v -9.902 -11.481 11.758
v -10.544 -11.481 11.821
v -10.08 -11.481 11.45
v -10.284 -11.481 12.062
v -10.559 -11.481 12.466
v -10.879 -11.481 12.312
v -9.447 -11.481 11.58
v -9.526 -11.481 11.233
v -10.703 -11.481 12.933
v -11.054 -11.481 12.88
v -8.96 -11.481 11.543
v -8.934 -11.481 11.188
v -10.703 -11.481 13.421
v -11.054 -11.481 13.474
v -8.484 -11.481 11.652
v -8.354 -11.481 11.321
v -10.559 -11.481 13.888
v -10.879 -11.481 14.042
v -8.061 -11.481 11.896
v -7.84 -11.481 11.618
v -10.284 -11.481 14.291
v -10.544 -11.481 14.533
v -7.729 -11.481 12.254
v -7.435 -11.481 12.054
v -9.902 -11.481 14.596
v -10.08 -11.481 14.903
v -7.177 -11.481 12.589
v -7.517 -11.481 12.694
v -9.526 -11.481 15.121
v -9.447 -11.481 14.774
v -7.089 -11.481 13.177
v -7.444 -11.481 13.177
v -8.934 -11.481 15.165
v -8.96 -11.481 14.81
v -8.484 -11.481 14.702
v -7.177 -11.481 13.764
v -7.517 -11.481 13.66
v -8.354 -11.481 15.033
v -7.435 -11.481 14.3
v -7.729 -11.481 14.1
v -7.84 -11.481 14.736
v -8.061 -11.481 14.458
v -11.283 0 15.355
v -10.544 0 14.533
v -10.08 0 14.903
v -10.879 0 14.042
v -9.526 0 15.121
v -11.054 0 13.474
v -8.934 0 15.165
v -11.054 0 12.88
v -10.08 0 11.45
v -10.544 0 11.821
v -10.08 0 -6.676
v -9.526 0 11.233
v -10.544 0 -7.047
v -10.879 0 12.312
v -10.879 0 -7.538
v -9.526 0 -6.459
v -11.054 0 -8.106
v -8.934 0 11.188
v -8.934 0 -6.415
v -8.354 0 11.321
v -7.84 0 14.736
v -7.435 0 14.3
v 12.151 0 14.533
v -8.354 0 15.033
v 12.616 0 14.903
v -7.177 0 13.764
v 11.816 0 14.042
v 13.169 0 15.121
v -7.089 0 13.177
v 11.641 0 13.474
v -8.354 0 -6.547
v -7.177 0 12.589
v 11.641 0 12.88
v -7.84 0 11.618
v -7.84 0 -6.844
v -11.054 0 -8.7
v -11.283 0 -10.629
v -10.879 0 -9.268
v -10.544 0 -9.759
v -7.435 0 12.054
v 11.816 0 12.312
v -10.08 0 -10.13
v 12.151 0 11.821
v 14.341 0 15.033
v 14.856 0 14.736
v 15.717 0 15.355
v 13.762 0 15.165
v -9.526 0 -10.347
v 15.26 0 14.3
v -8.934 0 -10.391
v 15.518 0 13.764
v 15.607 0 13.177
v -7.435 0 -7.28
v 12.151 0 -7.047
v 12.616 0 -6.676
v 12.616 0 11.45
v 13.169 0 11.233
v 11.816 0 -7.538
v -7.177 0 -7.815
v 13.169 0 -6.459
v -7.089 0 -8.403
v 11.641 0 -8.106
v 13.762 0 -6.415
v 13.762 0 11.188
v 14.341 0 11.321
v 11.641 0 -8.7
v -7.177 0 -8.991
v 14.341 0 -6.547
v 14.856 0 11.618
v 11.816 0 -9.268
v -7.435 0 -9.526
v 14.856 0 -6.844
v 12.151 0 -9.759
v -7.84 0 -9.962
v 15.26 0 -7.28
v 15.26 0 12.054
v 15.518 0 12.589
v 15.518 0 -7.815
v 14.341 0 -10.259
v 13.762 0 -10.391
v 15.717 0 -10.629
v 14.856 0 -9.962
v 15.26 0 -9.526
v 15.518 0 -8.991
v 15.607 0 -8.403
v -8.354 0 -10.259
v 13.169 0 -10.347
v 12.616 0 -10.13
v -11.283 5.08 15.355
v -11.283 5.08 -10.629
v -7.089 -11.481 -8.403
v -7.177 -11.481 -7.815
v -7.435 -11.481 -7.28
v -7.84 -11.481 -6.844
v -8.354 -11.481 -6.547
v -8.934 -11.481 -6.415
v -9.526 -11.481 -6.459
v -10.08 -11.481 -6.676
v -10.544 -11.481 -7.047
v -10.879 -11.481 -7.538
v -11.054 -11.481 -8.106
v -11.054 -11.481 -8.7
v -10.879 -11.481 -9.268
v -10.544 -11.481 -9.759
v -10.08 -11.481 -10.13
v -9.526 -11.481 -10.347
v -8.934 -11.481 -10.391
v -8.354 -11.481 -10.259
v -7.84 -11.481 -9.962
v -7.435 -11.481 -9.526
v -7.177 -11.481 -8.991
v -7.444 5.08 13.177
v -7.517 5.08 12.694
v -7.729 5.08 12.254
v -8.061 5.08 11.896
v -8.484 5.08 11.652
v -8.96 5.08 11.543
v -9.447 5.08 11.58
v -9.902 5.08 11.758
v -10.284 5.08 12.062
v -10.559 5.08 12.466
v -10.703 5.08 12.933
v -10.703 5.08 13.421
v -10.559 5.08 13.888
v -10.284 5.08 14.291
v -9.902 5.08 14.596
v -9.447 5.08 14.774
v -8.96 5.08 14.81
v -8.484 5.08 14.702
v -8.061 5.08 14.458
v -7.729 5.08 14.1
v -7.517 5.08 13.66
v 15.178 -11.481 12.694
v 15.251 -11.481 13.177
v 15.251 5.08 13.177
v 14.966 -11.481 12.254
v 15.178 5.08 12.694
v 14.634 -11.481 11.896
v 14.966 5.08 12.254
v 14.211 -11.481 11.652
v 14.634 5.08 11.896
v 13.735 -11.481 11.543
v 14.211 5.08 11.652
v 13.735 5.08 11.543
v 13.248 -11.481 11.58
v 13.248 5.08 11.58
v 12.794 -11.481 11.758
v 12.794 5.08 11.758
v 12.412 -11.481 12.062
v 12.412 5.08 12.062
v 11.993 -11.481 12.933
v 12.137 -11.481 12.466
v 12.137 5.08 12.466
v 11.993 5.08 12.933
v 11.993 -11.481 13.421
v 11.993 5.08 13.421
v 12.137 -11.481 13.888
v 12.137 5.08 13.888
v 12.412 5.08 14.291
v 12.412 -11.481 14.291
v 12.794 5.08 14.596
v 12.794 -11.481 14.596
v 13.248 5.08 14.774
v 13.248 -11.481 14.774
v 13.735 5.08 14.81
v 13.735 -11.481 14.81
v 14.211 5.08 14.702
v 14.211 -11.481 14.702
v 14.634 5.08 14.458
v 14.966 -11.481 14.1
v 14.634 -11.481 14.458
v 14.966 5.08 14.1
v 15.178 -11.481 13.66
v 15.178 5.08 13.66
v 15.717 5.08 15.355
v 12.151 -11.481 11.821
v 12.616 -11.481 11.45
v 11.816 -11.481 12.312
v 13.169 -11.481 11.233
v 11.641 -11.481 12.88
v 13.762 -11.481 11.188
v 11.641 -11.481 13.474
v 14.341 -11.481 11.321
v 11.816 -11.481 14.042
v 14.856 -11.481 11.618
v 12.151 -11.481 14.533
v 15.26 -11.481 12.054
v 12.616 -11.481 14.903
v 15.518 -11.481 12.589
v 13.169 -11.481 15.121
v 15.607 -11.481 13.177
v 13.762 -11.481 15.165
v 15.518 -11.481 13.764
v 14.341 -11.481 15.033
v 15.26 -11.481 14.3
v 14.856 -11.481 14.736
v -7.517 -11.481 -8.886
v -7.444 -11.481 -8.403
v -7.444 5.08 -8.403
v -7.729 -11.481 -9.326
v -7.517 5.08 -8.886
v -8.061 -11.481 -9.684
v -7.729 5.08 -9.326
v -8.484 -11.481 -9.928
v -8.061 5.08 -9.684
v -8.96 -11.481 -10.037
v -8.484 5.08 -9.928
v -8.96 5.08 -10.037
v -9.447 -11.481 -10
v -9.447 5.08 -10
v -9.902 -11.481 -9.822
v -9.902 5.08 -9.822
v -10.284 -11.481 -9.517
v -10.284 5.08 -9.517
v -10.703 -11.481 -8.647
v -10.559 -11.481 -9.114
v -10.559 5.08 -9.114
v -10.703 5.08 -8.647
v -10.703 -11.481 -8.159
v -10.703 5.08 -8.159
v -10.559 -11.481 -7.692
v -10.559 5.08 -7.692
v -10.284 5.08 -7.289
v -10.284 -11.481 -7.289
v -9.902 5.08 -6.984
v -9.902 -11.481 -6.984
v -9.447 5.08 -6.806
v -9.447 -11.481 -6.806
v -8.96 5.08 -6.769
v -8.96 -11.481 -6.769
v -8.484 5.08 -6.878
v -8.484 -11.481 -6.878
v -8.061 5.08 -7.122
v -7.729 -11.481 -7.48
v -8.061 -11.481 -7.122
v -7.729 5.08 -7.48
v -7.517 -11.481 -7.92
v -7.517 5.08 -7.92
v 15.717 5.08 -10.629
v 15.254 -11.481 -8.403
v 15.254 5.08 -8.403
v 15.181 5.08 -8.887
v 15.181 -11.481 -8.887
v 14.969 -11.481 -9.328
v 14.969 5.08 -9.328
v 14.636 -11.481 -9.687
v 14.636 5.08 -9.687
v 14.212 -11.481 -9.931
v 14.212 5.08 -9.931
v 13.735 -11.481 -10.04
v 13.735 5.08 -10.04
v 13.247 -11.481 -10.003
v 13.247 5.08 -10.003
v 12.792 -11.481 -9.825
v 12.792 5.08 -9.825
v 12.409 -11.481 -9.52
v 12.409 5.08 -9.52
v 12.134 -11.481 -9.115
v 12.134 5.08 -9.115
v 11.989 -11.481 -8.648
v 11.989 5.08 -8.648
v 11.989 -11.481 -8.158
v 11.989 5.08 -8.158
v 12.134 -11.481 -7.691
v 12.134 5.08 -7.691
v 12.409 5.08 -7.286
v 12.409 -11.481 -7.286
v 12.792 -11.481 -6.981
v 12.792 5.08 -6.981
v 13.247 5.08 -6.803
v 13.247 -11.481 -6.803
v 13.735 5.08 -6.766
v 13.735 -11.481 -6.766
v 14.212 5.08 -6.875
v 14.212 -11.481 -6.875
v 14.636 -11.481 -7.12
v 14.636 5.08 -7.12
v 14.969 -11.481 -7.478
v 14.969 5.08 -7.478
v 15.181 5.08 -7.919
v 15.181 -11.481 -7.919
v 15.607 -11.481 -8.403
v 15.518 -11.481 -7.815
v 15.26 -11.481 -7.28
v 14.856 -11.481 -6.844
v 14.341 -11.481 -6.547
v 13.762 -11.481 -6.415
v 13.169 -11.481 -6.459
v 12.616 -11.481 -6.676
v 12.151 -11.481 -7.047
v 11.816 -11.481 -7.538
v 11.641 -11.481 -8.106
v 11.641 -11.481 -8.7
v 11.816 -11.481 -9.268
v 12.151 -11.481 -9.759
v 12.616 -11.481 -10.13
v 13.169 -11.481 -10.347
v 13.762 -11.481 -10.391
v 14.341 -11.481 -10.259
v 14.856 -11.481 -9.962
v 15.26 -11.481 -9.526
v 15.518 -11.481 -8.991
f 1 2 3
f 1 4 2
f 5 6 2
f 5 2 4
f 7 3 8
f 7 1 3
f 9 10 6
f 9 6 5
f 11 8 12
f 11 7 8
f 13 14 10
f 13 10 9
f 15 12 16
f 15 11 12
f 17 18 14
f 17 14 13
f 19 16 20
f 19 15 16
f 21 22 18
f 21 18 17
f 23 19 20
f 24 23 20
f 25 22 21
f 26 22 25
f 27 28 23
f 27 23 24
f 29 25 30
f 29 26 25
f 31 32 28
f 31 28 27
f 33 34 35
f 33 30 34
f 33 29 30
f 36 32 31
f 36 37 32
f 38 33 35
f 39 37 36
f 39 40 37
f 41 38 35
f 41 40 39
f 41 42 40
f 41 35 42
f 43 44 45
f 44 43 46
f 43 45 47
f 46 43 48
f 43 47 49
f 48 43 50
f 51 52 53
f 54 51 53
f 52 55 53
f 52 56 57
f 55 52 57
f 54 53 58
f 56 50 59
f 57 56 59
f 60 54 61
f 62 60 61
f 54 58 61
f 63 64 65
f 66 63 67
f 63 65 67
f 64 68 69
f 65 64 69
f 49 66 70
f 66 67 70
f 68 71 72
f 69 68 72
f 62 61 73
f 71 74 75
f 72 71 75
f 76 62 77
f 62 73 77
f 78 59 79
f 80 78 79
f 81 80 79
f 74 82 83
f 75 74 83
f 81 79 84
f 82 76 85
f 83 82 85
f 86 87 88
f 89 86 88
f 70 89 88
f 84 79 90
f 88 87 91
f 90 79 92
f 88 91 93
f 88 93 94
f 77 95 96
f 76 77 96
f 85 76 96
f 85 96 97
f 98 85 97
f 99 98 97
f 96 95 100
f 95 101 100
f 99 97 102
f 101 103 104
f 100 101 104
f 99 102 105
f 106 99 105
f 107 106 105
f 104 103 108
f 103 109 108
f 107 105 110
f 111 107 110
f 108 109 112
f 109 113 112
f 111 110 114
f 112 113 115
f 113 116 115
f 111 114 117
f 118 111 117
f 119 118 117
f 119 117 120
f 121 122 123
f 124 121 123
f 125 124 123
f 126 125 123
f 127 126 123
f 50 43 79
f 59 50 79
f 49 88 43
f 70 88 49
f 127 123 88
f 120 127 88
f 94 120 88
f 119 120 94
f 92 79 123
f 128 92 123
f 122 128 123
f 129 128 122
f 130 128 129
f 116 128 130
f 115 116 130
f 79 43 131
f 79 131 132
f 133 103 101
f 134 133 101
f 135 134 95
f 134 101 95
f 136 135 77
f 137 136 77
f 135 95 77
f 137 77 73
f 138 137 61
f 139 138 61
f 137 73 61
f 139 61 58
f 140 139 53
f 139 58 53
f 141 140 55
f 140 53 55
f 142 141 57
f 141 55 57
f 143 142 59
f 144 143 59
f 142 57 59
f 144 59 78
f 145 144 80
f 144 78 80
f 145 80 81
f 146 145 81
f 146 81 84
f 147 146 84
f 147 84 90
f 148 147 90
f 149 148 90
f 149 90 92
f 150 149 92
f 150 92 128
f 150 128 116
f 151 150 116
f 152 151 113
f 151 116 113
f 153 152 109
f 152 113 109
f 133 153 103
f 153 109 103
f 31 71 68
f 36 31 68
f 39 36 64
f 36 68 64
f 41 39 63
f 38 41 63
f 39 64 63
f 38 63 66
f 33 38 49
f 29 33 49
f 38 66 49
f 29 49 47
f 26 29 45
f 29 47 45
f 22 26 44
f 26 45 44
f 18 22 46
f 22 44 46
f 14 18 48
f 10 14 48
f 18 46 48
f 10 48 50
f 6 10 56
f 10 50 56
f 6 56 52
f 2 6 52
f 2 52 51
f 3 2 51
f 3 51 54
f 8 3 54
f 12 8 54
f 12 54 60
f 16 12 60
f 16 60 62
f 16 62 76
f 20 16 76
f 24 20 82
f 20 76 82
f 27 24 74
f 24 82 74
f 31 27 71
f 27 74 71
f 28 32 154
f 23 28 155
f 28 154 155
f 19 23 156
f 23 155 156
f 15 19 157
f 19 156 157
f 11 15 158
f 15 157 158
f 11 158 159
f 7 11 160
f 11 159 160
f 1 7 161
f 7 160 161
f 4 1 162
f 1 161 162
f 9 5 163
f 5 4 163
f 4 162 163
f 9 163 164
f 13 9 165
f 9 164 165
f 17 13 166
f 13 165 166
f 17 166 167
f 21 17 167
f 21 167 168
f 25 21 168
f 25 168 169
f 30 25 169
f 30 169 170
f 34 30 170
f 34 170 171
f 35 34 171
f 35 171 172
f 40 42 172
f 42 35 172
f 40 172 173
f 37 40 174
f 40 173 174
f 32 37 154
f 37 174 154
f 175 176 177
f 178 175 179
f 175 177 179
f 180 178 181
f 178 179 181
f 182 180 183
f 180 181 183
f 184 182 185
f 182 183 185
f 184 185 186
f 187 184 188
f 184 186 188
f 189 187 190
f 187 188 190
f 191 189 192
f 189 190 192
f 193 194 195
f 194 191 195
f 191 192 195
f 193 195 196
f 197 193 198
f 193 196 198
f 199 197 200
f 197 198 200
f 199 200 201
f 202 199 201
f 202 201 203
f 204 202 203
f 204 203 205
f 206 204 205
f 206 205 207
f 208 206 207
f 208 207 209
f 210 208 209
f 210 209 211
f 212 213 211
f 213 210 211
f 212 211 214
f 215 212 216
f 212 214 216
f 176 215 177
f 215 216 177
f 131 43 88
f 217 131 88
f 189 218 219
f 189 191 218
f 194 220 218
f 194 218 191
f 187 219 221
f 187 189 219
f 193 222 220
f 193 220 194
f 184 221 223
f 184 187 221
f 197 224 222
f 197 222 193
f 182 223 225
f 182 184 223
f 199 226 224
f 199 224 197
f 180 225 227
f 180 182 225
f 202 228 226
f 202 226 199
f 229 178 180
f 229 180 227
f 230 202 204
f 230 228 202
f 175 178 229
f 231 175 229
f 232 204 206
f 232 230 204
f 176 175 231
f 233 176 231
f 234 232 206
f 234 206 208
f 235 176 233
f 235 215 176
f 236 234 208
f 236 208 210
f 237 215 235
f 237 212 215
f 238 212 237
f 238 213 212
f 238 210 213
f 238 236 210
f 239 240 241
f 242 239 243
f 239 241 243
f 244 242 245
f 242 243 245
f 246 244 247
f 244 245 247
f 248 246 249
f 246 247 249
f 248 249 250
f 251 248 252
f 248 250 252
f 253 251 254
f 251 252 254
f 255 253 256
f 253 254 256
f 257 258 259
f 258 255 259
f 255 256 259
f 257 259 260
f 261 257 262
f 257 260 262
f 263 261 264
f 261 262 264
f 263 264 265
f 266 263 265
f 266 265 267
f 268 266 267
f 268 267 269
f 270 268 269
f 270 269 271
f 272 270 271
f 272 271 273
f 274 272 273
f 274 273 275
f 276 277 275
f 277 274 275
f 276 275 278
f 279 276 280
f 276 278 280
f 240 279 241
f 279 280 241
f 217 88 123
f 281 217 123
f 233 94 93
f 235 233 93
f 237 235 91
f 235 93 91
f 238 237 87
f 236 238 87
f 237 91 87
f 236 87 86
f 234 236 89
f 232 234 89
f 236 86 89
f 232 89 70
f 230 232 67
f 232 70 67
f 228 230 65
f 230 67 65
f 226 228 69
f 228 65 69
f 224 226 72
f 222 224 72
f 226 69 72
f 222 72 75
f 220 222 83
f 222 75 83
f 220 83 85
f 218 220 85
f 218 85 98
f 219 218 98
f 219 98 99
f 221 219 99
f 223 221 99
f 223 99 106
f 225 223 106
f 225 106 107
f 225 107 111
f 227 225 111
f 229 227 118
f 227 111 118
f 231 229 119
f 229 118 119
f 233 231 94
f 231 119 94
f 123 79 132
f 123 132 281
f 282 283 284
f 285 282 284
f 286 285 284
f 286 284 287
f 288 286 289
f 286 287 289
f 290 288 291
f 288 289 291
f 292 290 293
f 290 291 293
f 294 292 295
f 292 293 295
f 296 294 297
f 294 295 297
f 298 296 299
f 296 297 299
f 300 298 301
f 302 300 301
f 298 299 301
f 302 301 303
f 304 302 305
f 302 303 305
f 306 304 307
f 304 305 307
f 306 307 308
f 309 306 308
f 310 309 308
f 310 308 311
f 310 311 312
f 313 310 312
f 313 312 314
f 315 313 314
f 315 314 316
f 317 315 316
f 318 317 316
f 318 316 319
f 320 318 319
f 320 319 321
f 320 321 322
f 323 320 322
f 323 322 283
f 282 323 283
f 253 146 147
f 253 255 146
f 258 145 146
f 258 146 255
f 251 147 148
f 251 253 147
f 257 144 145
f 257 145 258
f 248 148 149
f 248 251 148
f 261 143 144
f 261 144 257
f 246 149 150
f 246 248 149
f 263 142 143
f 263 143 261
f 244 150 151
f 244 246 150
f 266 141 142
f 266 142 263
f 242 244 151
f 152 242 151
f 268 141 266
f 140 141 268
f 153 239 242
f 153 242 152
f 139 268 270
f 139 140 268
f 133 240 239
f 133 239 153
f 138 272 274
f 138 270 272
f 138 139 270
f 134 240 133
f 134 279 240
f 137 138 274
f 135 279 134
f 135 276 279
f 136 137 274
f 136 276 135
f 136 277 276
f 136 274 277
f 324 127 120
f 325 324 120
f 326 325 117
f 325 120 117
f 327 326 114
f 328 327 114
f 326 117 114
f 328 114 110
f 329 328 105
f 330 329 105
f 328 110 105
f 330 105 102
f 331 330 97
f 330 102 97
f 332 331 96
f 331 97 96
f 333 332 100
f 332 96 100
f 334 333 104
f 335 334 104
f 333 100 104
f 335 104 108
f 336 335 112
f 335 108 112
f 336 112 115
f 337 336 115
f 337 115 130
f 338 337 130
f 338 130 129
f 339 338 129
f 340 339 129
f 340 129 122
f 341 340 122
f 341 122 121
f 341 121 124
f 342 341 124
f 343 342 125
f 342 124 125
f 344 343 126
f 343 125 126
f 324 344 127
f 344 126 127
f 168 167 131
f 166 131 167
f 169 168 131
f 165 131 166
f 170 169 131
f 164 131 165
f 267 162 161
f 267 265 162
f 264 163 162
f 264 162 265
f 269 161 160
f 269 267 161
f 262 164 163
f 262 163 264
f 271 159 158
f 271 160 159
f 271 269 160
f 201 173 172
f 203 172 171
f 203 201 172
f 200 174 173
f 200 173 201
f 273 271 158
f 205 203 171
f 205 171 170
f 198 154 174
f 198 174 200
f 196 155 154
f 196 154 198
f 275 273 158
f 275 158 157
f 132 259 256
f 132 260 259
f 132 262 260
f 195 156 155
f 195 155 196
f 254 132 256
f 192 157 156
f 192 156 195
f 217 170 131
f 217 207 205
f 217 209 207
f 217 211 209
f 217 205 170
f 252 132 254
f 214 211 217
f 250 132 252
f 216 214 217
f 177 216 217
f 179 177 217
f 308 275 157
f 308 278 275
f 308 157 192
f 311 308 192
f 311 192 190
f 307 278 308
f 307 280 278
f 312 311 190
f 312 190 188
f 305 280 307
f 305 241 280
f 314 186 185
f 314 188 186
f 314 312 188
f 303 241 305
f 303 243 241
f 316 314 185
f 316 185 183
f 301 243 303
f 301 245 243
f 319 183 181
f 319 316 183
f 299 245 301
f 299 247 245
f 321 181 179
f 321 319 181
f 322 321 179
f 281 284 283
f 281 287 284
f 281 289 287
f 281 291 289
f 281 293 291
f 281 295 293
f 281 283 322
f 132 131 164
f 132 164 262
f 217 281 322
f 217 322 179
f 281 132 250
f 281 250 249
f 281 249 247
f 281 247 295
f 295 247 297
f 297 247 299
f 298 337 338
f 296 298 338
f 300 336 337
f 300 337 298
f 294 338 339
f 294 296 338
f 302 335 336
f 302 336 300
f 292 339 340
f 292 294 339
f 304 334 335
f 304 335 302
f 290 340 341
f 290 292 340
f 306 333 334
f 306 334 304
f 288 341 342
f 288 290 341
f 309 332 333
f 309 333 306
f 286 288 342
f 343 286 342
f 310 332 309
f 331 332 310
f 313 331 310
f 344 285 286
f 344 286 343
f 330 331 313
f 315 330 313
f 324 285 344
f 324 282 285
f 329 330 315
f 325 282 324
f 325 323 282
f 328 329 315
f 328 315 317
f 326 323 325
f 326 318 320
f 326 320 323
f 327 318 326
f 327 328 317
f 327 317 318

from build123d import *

# Parameters (mm, degrees)
SKETCH1_W               = 27.0002
SKETCH1_H               = 25.9842
BOSS_EXTRUDE1_DEPTH     = 5.08
SKETCH2_R               = 1.9939
SKETCH2_R_2             = 1.6383
BOSS_EXTRUDE2_DEPTH     = 11.4808
SKETCH3_R               = 1.641593419
SKETCH3_R_2             = 1.6383
CUT_EXTRUDE1_DEPTH      = 1
CUT_EXTRUDE1_DEPTH_BACK = 17.5608


with BuildPart() as part:
    # Sketch1 → Boss-Extrude1 (new body)
    with BuildSketch(Plane(origin=(0, 0, 0), x_dir=(1, 0, 0), z_dir=(0, 1, 0))):
        with Locations((2.217200719, -2.362930935)):
            Rectangle(SKETCH1_W, SKETCH1_H)
    extrude(amount=BOSS_EXTRUDE1_DEPTH)

    # Sketch2 → Boss-Extrude2 (add)
    with BuildSketch(Plane.XZ):
        with Locations((-9.082699611, 13.17672836)):
            Circle(SKETCH2_R)
        with Locations((-9.082699611, 13.17672836)):
            Circle(SKETCH2_R_2, mode=Mode.SUBTRACT)
        with Locations((13.612727851, 13.17672836)):
            Circle(SKETCH2_R)
        with Locations((13.612727851, 13.17672836)):
            Circle(SKETCH2_R_2, mode=Mode.SUBTRACT)
        with Locations((-9.082699611, -8.403053089)):
            Circle(SKETCH2_R)
        with Locations((-9.082699611, -8.403053089)):
            Circle(SKETCH2_R_2, mode=Mode.SUBTRACT)
        with Locations((13.612727851, -8.403053089)):
            Circle(SKETCH2_R)
        with Locations((13.612727851, -8.403053089)):
            Circle(SKETCH2_R_2, mode=Mode.SUBTRACT)
    extrude(amount=BOSS_EXTRUDE2_DEPTH)

    # Sketch3 → Cut-Extrude1 (cut, two sides)
    with BuildSketch(Plane(origin=(0, 5.08, 0), x_dir=(1, 0, 0), z_dir=(0, 1, 0))) as cut_extrude1_sk:
        with Locations((13.612727851, 8.403053089)):
            Circle(SKETCH3_R)
        with Locations((-9.082699611, 8.403053089)):
            Circle(SKETCH3_R_2)
        with Locations((13.612727851, -13.17672836)):
            Circle(SKETCH3_R_2)
        with Locations((-9.082699611, -13.17672836)):
            Circle(SKETCH3_R_2)
    extrude(amount=CUT_EXTRUDE1_DEPTH, mode=Mode.SUBTRACT)
    extrude(cut_extrude1_sk.sketch, amount=-CUT_EXTRUDE1_DEPTH_BACK, mode=Mode.SUBTRACT)


solid = part.part
